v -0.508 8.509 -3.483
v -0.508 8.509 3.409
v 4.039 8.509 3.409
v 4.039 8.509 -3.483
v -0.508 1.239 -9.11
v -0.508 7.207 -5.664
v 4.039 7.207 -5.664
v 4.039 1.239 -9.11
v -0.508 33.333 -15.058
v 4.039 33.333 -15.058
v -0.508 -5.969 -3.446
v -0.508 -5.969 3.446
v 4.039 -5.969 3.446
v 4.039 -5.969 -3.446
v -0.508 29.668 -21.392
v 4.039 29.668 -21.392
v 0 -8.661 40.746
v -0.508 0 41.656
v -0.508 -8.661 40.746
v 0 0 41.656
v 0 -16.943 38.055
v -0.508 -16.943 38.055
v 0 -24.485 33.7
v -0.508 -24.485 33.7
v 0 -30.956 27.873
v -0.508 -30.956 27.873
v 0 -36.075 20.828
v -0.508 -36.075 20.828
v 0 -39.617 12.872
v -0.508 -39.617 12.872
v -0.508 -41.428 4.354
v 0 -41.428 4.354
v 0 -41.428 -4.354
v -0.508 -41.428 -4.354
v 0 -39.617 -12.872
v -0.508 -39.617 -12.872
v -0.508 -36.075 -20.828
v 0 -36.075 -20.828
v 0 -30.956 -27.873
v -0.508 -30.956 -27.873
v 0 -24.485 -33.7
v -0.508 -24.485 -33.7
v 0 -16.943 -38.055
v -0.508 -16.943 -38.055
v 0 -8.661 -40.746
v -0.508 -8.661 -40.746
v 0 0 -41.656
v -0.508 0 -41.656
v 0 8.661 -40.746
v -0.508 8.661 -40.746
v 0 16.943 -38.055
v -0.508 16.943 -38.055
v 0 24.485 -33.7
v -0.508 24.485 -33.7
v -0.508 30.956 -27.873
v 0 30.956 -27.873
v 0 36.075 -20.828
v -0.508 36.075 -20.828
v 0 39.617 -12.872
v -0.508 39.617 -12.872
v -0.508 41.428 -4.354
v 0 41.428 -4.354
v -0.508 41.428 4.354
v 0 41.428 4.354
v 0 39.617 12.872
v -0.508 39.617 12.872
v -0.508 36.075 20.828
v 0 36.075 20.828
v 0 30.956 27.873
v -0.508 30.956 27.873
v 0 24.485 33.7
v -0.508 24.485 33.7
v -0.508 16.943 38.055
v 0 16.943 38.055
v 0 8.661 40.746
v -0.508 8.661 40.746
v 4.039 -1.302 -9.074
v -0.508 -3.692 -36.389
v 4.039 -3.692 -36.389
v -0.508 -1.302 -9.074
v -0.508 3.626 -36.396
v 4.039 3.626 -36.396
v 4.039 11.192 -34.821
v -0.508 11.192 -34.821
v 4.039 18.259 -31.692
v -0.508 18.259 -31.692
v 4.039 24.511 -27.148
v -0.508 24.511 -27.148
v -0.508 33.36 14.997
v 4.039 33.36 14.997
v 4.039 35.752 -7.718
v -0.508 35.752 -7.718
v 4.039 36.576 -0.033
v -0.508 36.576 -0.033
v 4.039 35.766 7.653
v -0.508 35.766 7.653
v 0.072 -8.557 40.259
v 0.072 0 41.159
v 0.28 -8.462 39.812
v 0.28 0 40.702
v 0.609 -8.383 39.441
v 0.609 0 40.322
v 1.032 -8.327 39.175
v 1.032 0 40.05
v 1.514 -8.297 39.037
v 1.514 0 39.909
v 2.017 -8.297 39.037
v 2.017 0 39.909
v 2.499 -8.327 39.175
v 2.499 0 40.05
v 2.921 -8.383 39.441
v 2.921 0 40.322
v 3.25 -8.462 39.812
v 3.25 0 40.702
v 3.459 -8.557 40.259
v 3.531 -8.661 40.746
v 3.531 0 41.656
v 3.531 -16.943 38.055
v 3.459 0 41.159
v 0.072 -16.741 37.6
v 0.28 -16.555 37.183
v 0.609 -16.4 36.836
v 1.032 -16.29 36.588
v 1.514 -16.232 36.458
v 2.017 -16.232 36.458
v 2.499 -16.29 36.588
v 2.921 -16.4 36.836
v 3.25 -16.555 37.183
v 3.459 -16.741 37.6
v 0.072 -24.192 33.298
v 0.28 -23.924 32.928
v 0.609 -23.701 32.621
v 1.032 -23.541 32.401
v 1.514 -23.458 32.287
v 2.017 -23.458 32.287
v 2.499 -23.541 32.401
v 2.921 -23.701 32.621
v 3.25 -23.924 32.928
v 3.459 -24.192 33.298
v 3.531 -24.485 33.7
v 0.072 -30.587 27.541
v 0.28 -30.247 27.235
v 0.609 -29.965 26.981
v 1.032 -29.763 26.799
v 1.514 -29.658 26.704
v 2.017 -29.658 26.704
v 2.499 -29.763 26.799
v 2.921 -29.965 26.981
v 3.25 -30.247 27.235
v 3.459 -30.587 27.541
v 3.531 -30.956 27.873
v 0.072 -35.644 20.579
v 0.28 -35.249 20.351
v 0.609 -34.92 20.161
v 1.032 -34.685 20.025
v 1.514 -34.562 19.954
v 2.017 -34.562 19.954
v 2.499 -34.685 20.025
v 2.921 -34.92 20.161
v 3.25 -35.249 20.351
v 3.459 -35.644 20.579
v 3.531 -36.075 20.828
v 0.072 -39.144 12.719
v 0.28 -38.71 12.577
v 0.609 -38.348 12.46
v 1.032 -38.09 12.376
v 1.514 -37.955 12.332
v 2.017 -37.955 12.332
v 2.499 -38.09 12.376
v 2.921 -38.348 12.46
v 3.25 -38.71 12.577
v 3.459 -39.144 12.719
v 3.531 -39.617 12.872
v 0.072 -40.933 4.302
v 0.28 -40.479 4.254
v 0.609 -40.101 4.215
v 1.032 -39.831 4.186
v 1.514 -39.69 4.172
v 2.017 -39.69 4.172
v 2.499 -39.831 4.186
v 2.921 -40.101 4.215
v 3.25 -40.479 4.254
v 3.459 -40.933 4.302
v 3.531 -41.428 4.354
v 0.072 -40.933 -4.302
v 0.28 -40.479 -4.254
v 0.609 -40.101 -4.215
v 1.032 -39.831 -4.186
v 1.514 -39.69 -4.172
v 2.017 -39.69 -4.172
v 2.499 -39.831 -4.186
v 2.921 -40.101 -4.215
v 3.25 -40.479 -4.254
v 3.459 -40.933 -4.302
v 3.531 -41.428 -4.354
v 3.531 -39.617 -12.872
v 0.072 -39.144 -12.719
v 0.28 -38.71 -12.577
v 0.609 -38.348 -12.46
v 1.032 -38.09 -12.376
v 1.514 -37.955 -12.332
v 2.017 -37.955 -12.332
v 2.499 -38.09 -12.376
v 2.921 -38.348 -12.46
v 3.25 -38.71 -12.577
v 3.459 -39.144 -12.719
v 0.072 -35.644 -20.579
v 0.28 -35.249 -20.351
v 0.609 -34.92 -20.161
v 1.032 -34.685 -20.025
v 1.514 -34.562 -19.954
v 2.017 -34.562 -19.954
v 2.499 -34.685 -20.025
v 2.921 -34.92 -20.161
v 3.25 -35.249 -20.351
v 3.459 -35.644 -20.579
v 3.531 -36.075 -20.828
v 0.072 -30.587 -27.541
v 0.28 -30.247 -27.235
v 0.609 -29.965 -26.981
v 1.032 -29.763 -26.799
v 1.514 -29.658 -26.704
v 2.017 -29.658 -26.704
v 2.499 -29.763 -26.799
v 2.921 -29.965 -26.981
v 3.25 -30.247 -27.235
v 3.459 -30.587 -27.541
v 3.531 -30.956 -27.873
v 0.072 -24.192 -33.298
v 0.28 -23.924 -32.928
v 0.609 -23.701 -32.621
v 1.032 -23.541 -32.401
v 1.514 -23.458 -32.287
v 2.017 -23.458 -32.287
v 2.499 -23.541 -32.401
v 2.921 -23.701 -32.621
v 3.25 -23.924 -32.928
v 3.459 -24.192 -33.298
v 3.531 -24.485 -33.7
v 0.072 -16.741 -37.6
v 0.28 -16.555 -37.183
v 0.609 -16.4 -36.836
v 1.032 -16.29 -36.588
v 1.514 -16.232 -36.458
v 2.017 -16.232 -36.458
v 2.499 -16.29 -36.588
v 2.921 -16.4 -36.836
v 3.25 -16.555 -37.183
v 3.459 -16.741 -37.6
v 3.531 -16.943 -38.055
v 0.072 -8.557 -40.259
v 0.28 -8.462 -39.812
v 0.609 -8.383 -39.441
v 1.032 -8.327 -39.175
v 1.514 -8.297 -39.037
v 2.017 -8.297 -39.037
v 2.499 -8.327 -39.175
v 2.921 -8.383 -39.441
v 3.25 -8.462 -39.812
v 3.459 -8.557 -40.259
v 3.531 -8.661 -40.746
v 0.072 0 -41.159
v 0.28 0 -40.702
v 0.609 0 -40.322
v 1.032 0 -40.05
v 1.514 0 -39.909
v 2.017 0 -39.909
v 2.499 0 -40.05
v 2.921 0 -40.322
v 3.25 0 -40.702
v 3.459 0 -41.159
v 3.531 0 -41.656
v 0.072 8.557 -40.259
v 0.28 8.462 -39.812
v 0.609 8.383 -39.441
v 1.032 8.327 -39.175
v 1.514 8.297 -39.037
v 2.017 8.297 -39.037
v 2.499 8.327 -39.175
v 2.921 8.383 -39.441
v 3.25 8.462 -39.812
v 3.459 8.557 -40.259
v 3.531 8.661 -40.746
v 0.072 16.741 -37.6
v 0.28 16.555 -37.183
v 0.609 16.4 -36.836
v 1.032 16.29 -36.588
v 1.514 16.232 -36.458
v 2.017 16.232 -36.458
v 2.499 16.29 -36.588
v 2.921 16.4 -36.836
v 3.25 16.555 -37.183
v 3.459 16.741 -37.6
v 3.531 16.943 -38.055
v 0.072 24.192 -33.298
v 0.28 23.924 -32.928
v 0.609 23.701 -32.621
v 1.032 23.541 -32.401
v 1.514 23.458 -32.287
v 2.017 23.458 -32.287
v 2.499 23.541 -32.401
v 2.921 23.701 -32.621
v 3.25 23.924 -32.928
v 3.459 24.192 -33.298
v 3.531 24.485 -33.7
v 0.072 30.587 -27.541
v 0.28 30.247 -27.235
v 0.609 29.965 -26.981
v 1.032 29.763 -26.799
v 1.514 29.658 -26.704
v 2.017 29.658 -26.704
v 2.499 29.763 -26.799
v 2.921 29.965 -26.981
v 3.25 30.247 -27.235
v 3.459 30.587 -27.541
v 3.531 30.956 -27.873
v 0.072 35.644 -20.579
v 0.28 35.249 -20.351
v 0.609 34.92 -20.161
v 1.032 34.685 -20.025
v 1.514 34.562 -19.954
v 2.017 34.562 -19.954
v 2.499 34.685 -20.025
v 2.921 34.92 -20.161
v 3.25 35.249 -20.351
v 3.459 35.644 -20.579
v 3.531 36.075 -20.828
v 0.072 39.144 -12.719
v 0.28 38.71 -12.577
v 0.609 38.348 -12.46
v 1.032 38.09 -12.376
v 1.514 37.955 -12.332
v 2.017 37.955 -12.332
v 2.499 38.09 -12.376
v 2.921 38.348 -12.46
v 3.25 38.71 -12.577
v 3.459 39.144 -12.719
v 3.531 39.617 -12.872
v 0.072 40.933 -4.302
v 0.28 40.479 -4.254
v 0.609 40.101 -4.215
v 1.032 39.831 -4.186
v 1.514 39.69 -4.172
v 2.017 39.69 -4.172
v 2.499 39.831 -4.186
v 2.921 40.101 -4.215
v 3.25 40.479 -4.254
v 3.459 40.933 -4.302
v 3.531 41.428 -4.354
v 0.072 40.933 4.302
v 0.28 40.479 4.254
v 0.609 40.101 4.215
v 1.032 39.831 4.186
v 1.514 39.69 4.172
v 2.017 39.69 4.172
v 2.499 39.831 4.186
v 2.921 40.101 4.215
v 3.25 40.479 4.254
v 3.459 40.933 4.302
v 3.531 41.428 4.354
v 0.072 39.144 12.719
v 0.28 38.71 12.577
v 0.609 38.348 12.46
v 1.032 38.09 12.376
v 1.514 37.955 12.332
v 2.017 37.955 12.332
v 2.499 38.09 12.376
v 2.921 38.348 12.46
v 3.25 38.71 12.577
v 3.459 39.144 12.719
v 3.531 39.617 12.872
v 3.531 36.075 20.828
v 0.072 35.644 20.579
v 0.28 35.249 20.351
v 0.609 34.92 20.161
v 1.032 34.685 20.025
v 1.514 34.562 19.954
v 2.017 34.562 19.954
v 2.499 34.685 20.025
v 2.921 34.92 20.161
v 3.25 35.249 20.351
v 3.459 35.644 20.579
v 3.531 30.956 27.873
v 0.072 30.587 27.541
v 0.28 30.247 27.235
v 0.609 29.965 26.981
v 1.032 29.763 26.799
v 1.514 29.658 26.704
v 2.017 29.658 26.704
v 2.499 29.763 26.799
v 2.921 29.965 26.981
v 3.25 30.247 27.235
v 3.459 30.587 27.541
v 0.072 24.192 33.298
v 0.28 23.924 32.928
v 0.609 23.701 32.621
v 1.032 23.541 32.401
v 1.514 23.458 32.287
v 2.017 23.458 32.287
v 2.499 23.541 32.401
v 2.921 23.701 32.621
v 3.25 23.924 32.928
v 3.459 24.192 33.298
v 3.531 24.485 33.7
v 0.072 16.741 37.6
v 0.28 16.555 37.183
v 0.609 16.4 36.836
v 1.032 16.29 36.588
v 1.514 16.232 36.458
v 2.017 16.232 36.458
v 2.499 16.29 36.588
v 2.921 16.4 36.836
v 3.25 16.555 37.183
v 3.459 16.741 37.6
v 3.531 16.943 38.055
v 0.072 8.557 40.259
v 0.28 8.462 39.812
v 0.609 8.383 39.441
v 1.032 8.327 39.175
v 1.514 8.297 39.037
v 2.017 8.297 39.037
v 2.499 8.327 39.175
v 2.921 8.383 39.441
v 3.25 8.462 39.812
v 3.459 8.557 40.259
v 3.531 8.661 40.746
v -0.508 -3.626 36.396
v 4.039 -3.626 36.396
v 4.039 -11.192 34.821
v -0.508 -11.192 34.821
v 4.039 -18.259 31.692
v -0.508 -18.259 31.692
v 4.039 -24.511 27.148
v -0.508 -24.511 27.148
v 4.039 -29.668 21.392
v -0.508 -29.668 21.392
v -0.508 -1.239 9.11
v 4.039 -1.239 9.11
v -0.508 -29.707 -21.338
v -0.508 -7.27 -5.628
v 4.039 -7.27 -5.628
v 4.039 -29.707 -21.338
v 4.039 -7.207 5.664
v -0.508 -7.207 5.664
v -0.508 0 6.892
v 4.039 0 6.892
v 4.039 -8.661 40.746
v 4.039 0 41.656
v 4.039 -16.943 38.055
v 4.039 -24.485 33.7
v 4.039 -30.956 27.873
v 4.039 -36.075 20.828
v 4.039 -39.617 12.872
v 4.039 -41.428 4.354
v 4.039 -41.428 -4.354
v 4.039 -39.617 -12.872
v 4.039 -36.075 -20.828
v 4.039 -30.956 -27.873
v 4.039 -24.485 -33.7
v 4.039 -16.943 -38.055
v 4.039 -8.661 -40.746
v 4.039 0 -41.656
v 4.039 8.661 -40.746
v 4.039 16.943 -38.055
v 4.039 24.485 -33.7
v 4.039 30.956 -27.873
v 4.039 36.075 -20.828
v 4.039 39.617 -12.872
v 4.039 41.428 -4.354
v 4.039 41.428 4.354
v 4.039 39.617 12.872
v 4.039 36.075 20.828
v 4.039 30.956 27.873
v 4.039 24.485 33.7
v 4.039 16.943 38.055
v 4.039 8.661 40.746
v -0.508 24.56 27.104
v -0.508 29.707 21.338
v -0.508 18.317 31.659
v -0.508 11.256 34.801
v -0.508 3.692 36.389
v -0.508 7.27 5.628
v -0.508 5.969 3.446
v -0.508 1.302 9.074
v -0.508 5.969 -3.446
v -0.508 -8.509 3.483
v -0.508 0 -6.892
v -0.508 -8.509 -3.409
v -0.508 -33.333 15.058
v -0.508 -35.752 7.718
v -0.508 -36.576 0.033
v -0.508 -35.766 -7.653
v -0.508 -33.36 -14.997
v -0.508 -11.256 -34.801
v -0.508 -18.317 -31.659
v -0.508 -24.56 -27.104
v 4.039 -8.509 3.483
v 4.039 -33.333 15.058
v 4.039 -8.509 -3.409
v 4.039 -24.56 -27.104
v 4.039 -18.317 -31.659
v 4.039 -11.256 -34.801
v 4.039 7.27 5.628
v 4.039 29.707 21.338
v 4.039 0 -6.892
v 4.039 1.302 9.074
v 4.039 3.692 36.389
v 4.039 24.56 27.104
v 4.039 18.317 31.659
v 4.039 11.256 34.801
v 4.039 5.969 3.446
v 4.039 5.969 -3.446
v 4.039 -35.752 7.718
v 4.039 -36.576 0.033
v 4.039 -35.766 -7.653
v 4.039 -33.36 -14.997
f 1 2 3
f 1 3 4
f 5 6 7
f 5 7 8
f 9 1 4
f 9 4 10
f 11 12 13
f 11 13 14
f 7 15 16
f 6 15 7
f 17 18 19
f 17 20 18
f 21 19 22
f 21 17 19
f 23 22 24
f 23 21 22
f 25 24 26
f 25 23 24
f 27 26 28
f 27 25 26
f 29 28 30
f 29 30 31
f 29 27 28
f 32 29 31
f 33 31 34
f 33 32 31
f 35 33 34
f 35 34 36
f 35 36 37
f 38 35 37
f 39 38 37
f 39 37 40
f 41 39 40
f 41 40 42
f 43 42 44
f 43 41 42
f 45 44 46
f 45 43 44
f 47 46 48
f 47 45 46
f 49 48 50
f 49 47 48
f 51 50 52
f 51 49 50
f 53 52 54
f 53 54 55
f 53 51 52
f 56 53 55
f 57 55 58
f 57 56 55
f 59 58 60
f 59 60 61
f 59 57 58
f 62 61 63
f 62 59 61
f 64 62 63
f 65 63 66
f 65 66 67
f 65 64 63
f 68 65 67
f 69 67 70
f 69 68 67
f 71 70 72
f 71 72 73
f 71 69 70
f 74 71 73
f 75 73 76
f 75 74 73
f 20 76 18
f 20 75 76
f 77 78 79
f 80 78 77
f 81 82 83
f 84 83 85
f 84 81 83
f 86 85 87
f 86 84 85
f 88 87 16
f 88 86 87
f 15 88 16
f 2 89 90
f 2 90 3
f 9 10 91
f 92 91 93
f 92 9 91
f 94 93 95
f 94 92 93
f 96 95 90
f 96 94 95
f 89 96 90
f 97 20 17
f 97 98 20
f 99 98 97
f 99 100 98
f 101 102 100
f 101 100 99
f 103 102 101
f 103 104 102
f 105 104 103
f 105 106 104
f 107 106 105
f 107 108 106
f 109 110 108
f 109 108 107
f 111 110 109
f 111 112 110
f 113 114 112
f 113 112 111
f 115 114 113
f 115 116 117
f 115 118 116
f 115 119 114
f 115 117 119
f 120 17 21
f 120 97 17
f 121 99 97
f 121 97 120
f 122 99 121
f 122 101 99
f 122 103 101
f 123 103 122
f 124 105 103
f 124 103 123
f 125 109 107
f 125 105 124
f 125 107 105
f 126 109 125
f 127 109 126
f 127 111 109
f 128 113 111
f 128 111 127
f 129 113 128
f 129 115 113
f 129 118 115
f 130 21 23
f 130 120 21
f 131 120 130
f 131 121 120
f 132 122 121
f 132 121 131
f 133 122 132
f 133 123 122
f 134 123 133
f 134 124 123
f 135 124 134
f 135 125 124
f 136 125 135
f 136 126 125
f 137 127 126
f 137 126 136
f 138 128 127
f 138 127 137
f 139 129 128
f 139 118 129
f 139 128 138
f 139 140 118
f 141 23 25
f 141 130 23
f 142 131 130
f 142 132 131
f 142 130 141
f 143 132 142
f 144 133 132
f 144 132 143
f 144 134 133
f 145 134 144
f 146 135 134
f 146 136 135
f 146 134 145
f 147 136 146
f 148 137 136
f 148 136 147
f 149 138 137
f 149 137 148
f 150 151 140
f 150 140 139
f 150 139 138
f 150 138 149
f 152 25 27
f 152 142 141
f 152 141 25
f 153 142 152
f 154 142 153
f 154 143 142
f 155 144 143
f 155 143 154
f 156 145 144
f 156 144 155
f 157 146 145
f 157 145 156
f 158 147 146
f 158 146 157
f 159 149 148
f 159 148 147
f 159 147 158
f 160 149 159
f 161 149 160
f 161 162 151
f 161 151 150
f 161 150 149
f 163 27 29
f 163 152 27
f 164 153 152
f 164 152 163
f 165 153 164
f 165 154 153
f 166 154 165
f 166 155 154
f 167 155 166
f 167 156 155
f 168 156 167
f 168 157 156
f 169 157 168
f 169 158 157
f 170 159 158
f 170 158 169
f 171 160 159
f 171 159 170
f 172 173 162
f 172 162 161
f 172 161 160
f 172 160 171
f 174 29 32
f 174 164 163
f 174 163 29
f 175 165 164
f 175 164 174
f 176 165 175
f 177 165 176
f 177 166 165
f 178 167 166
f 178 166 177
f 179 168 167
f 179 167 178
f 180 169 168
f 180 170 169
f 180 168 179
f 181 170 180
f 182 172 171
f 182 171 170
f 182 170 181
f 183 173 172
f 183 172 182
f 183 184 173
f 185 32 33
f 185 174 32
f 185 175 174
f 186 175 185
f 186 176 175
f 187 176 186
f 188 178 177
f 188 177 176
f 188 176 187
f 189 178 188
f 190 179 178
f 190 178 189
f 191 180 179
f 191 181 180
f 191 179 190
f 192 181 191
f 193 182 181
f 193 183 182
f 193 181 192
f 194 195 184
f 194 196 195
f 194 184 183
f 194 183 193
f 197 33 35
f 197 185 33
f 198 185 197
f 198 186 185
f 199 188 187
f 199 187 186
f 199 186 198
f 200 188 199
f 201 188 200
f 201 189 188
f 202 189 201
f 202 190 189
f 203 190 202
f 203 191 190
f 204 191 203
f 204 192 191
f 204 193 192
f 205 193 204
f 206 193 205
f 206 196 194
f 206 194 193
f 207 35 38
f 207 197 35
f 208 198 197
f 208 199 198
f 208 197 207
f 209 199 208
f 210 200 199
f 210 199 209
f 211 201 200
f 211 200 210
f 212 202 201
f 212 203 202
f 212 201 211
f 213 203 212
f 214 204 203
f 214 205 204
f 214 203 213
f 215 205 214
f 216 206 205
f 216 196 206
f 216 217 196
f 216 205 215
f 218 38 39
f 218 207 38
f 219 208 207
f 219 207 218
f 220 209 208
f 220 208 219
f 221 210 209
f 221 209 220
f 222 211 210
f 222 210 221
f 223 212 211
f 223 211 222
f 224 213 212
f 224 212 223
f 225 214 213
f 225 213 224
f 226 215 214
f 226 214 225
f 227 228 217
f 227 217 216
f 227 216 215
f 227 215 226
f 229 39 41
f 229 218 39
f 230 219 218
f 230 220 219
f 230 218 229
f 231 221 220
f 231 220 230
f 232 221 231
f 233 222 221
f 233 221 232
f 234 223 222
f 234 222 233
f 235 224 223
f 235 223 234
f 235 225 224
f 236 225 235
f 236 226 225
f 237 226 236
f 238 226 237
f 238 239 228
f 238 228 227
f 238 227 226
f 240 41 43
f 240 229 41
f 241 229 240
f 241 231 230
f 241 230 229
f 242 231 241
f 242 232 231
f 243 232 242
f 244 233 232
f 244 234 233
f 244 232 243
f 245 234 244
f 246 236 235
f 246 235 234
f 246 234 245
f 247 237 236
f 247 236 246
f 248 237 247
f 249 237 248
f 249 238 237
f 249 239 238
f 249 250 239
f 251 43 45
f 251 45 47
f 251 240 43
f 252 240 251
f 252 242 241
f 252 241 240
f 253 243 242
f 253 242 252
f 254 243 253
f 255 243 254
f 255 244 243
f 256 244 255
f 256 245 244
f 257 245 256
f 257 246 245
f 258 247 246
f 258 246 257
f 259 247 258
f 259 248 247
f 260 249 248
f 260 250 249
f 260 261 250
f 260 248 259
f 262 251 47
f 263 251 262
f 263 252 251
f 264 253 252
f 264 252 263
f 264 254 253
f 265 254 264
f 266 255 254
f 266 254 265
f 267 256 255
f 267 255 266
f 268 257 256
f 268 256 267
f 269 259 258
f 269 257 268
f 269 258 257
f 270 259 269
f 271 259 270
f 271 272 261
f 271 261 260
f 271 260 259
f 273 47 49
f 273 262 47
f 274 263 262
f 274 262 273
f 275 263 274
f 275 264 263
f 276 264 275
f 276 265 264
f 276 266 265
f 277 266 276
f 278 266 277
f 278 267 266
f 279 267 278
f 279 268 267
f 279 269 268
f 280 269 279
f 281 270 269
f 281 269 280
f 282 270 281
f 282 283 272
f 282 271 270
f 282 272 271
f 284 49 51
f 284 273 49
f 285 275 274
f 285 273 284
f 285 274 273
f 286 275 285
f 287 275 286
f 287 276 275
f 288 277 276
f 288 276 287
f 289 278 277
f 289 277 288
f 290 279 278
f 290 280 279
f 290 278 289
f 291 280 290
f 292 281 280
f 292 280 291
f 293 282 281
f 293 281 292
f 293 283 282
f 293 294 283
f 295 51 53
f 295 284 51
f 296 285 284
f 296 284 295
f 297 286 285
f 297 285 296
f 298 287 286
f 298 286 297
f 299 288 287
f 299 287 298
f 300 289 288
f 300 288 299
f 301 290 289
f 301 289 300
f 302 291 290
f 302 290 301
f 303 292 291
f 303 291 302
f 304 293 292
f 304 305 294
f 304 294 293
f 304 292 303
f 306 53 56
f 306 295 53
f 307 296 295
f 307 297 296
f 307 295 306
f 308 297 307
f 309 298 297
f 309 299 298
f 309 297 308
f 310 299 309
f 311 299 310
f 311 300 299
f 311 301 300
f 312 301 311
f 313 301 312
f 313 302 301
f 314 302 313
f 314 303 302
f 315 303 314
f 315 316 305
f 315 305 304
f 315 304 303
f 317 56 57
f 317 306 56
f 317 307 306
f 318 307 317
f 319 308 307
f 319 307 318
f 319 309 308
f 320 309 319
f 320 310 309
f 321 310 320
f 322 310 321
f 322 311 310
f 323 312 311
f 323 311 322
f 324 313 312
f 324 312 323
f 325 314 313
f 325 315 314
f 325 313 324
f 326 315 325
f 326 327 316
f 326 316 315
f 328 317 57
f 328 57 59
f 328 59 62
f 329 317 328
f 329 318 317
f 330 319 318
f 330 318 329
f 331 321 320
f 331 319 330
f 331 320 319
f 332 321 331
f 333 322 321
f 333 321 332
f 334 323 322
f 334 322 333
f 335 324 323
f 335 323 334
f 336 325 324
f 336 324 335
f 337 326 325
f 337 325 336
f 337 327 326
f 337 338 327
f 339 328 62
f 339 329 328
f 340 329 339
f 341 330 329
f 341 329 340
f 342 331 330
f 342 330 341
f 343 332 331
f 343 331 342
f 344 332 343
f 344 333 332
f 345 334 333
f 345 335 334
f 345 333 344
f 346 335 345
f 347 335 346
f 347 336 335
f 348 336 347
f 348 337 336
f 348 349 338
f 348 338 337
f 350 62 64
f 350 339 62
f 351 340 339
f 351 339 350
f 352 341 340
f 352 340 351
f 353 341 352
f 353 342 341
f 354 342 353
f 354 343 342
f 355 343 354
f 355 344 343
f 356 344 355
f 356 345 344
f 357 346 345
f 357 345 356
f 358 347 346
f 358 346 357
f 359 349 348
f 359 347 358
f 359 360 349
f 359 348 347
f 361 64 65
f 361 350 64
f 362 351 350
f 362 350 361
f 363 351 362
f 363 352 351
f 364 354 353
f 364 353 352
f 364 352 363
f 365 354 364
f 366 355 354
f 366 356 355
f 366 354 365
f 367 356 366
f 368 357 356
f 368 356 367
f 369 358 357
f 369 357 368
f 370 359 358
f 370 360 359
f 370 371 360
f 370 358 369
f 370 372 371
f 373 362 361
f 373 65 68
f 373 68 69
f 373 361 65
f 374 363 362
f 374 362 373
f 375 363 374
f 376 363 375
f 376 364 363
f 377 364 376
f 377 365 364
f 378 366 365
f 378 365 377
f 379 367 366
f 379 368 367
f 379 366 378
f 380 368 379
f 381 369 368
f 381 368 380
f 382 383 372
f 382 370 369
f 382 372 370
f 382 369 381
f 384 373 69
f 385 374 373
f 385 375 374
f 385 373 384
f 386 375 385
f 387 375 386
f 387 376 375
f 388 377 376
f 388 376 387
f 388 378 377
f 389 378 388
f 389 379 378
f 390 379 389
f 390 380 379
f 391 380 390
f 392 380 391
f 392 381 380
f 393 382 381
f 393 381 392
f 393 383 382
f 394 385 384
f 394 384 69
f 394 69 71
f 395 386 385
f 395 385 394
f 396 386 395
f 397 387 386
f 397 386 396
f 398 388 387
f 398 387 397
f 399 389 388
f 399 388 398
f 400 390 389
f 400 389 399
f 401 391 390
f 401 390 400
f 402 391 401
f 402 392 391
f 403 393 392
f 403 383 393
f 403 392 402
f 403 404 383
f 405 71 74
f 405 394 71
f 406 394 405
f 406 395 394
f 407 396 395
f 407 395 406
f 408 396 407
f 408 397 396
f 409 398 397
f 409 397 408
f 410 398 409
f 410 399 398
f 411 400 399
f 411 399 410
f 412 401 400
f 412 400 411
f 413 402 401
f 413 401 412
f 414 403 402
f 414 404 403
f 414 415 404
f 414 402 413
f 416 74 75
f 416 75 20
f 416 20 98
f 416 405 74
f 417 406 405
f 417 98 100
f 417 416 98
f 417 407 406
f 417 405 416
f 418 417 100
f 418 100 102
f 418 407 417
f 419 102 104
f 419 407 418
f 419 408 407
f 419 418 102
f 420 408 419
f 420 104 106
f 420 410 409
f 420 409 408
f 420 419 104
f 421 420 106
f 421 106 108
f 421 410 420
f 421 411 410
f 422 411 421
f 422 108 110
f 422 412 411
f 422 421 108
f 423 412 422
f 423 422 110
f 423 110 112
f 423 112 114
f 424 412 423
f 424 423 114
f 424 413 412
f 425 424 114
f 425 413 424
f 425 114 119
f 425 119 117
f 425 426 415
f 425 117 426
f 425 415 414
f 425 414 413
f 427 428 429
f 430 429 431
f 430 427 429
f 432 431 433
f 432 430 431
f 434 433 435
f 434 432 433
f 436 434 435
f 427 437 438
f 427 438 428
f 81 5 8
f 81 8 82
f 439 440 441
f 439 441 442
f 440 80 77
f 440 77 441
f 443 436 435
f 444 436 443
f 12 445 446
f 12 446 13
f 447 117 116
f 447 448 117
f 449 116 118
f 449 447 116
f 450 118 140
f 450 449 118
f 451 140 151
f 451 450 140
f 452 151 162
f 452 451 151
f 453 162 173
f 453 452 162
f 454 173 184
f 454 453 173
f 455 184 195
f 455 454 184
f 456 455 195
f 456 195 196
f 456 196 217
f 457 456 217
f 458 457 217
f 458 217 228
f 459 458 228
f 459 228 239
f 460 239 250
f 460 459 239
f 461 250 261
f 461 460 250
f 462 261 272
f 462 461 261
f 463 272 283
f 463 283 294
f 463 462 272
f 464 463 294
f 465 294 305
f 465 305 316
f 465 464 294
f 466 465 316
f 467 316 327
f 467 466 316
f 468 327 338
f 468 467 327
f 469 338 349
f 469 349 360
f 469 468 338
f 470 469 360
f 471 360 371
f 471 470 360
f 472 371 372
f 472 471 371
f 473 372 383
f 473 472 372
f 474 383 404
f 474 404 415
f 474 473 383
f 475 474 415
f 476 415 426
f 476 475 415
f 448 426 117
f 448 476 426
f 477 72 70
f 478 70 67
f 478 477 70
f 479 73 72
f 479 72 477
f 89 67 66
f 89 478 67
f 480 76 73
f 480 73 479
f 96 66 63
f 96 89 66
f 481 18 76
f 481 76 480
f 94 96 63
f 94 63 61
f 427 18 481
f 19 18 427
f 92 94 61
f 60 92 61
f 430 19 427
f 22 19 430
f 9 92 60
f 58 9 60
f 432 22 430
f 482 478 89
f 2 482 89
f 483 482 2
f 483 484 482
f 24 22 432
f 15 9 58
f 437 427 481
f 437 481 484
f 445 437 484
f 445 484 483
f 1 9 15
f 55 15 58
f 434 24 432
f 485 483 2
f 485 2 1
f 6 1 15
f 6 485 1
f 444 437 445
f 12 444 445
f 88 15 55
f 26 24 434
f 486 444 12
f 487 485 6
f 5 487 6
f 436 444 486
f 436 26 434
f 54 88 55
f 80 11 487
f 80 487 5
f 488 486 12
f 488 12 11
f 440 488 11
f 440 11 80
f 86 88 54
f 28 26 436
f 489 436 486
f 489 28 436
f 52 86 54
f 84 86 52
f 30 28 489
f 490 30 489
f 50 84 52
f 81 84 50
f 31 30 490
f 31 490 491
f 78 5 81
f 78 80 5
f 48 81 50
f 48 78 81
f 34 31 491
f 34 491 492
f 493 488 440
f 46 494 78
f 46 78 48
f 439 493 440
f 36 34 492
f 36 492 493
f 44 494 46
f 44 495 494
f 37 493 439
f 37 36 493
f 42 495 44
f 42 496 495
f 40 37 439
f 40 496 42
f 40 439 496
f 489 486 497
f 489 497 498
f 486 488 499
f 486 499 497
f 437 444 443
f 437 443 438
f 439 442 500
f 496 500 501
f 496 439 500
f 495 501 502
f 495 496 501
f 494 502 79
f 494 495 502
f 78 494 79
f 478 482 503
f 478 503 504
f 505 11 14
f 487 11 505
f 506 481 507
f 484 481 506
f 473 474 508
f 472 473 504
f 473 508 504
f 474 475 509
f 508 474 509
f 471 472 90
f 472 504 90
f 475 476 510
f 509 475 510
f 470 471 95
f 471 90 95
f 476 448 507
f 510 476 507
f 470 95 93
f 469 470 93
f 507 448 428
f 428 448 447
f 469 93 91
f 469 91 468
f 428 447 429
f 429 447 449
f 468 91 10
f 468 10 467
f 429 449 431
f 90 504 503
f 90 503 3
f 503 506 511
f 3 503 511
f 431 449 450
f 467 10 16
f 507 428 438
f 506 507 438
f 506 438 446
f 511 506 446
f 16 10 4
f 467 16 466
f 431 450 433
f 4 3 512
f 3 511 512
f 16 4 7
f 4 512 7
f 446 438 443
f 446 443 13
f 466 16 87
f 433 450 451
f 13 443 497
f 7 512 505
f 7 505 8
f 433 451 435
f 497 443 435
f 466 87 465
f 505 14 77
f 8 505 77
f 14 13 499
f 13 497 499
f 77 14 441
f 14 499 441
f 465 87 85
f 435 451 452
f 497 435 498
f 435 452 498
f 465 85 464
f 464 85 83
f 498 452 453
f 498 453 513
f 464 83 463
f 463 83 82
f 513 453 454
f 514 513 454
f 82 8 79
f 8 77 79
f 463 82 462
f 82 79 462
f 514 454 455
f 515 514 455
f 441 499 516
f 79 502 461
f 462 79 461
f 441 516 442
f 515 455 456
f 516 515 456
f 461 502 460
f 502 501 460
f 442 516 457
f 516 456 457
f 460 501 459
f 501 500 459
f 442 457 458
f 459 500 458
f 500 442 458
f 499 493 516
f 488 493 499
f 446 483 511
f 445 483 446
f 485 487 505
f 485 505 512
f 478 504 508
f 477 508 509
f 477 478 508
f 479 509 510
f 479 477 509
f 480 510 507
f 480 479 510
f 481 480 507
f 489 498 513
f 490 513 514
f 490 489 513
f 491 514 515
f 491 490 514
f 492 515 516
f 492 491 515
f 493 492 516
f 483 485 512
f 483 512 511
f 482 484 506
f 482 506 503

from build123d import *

# Parameters (mm, degrees)
SKETCH2_W          = 0.508
SKETCH2_H          = 41.656
CUT_EXTRUDE1_REACH = 61.086
SKETCH3_R          = 1.651
CIRPATTERN1_COUNT  = 6


with BuildPart() as part:
    # Sketch2 → Revolve1 (revolve)
    with BuildSketch(Plane.XY, mode=Mode.PRIVATE) as revolve1_sk:
        with Locations((-0.254, 20.828)):
            Rectangle(SKETCH2_W, SKETCH2_H)
        with BuildLine():
            ThreePointArc((0, 41.656), (1.7653, 39.8907), (3.5306, 41.656))
            Line((3.5306, 41.656), (3.5306, 0))
            Line((3.5306, 0), (0, 0))
            Line((0, 0), (0, 41.656))
        make_face()
        with Locations((3.7846, 20.828)):
            Rectangle(SKETCH2_W, SKETCH2_H)
    revolve(revolve1_sk.sketch.rotate(Axis((0, 0, 0), (1, 0, 0)), 90), axis=Axis((0, 0, 0), (1, 0, 0)))

    # Sketch3 → Cut-Extrude1 (cut, up to next)
    with BuildSketch(Plane(origin=(-0.508, 0, 0), x_dir=(0, 0, -1), z_dir=(1, 0, 0)), mode=Mode.PRIVATE) as cut_extrude1_sk1:
        with BuildLine():
            ThreePointArc((6.764649654, 21.414174788), (-0.091034511, 22.457049662), (-6.938038467, 21.358627977))
            Line((-6.938038467, 21.358627977), (-3.409234604, 8.509))
            Line((-3.409234604, 8.509), (3.48250762, 8.509))
            Line((3.48250762, 8.509), (6.764649654, 21.414174788))
        make_face()
    cut_extrude1_tool1 = extrude(cut_extrude1_sk1.sketch, amount=CUT_EXTRUDE1_REACH, mode=Mode.PRIVATE) & part.part
    # Sketch3 → Cut-Extrude1 (cut, up to next)
    with BuildSketch(Plane(origin=(-0.508, 0, 0), x_dir=(0, 0, -1), z_dir=(1, 0, 0)), mode=Mode.PRIVATE) as cut_extrude1_sk2:
        with BuildLine():
            Line((6.764649654, 21.414174788), (3.48250762, 8.509))
            Line((3.48250762, 8.509), (15.057941963, 33.332599056))
            ThreePointArc((15.057941963, 33.332599056), (0.03320673, 36.575984926), (-14.997392963, 33.359885796))
            Line((-14.997392963, 33.359885796), (-3.409234604, 8.509))
            Line((-3.409234604, 8.509), (-6.938038467, 21.358627977))
            ThreePointArc((-6.938038467, 21.358627977), (-0.091034511, 22.457049662), (6.764649654, 21.414174788))
        make_face()
    cut_extrude1_tool2 = extrude(cut_extrude1_sk2.sketch, amount=CUT_EXTRUDE1_REACH, mode=Mode.PRIVATE) & part.part
    # Sketch3 → Cut-Extrude1 (cut, up to next)
    with BuildSketch(Plane(origin=(-0.508, 0, 0), x_dir=(0, 0, -1), z_dir=(1, 0, 0)), mode=Mode.PRIVATE) as cut_extrude1_sk3:
        Polygon((6.892407514, 0), (3.446203757, 5.969), (-3.446203757, 5.969), (-6.892407514, 0), (-3.446203757, -5.969), (3.446203757, -5.969), align=None)
        Circle(SKETCH3_R, mode=Mode.SUBTRACT)
    cut_extrude1_tool3 = extrude(cut_extrude1_sk3.sketch, amount=CUT_EXTRUDE1_REACH, mode=Mode.PRIVATE) & part.part
    # Sketch3 → Cut-Extrude1 (cut, up to next)
    with BuildSketch(Plane(origin=(-0.508, 0, 0), x_dir=(0, 0, -1), z_dir=(1, 0, 0)), mode=Mode.PRIVATE) as cut_extrude1_sk4:
        Circle(SKETCH3_R)
    cut_extrude1_tool4 = extrude(cut_extrude1_sk4.sketch, amount=CUT_EXTRUDE1_REACH, mode=Mode.PRIVATE) & part.part
    cut_extrude1_1 = cut_extrude1_tool1.solids().sort_by_distance((-0.508, 16.082461, 0.033427))[0]
    add(cut_extrude1_1, mode=Mode.SUBTRACT)
    cut_extrude1_2 = cut_extrude1_tool2.solids().sort_by_distance((-0.508, 28.201859, -0.056512))[0]
    add(cut_extrude1_2, mode=Mode.SUBTRACT)
    cut_extrude1_3 = cut_extrude1_tool3.solids().sort_by_distance((-0.508, 2.893322, -5.011381))[0]
    add(cut_extrude1_3, mode=Mode.SUBTRACT)
    cut_extrude1_4 = cut_extrude1_tool4.solids().sort_by_distance((-0.508, 0, 0))[0]
    add(cut_extrude1_4, mode=Mode.SUBTRACT)
    cut_extrude1 = cut_extrude1_1 + cut_extrude1_2 + cut_extrude1_3 + cut_extrude1_4  # Cut-Extrude1 as one shape, for the pattern or mirror that repeats it

    # CirPattern1: Cut-Extrude1 ×6 about axis
    cirpattern1_axis = Axis((0, 0, 0), (1, 0, 0))
    for i in range(1, CIRPATTERN1_COUNT):
        add(cut_extrude1.rotate(cirpattern1_axis, i * 360 / CIRPATTERN1_COUNT), mode=Mode.SUBTRACT)


solid = part.part
